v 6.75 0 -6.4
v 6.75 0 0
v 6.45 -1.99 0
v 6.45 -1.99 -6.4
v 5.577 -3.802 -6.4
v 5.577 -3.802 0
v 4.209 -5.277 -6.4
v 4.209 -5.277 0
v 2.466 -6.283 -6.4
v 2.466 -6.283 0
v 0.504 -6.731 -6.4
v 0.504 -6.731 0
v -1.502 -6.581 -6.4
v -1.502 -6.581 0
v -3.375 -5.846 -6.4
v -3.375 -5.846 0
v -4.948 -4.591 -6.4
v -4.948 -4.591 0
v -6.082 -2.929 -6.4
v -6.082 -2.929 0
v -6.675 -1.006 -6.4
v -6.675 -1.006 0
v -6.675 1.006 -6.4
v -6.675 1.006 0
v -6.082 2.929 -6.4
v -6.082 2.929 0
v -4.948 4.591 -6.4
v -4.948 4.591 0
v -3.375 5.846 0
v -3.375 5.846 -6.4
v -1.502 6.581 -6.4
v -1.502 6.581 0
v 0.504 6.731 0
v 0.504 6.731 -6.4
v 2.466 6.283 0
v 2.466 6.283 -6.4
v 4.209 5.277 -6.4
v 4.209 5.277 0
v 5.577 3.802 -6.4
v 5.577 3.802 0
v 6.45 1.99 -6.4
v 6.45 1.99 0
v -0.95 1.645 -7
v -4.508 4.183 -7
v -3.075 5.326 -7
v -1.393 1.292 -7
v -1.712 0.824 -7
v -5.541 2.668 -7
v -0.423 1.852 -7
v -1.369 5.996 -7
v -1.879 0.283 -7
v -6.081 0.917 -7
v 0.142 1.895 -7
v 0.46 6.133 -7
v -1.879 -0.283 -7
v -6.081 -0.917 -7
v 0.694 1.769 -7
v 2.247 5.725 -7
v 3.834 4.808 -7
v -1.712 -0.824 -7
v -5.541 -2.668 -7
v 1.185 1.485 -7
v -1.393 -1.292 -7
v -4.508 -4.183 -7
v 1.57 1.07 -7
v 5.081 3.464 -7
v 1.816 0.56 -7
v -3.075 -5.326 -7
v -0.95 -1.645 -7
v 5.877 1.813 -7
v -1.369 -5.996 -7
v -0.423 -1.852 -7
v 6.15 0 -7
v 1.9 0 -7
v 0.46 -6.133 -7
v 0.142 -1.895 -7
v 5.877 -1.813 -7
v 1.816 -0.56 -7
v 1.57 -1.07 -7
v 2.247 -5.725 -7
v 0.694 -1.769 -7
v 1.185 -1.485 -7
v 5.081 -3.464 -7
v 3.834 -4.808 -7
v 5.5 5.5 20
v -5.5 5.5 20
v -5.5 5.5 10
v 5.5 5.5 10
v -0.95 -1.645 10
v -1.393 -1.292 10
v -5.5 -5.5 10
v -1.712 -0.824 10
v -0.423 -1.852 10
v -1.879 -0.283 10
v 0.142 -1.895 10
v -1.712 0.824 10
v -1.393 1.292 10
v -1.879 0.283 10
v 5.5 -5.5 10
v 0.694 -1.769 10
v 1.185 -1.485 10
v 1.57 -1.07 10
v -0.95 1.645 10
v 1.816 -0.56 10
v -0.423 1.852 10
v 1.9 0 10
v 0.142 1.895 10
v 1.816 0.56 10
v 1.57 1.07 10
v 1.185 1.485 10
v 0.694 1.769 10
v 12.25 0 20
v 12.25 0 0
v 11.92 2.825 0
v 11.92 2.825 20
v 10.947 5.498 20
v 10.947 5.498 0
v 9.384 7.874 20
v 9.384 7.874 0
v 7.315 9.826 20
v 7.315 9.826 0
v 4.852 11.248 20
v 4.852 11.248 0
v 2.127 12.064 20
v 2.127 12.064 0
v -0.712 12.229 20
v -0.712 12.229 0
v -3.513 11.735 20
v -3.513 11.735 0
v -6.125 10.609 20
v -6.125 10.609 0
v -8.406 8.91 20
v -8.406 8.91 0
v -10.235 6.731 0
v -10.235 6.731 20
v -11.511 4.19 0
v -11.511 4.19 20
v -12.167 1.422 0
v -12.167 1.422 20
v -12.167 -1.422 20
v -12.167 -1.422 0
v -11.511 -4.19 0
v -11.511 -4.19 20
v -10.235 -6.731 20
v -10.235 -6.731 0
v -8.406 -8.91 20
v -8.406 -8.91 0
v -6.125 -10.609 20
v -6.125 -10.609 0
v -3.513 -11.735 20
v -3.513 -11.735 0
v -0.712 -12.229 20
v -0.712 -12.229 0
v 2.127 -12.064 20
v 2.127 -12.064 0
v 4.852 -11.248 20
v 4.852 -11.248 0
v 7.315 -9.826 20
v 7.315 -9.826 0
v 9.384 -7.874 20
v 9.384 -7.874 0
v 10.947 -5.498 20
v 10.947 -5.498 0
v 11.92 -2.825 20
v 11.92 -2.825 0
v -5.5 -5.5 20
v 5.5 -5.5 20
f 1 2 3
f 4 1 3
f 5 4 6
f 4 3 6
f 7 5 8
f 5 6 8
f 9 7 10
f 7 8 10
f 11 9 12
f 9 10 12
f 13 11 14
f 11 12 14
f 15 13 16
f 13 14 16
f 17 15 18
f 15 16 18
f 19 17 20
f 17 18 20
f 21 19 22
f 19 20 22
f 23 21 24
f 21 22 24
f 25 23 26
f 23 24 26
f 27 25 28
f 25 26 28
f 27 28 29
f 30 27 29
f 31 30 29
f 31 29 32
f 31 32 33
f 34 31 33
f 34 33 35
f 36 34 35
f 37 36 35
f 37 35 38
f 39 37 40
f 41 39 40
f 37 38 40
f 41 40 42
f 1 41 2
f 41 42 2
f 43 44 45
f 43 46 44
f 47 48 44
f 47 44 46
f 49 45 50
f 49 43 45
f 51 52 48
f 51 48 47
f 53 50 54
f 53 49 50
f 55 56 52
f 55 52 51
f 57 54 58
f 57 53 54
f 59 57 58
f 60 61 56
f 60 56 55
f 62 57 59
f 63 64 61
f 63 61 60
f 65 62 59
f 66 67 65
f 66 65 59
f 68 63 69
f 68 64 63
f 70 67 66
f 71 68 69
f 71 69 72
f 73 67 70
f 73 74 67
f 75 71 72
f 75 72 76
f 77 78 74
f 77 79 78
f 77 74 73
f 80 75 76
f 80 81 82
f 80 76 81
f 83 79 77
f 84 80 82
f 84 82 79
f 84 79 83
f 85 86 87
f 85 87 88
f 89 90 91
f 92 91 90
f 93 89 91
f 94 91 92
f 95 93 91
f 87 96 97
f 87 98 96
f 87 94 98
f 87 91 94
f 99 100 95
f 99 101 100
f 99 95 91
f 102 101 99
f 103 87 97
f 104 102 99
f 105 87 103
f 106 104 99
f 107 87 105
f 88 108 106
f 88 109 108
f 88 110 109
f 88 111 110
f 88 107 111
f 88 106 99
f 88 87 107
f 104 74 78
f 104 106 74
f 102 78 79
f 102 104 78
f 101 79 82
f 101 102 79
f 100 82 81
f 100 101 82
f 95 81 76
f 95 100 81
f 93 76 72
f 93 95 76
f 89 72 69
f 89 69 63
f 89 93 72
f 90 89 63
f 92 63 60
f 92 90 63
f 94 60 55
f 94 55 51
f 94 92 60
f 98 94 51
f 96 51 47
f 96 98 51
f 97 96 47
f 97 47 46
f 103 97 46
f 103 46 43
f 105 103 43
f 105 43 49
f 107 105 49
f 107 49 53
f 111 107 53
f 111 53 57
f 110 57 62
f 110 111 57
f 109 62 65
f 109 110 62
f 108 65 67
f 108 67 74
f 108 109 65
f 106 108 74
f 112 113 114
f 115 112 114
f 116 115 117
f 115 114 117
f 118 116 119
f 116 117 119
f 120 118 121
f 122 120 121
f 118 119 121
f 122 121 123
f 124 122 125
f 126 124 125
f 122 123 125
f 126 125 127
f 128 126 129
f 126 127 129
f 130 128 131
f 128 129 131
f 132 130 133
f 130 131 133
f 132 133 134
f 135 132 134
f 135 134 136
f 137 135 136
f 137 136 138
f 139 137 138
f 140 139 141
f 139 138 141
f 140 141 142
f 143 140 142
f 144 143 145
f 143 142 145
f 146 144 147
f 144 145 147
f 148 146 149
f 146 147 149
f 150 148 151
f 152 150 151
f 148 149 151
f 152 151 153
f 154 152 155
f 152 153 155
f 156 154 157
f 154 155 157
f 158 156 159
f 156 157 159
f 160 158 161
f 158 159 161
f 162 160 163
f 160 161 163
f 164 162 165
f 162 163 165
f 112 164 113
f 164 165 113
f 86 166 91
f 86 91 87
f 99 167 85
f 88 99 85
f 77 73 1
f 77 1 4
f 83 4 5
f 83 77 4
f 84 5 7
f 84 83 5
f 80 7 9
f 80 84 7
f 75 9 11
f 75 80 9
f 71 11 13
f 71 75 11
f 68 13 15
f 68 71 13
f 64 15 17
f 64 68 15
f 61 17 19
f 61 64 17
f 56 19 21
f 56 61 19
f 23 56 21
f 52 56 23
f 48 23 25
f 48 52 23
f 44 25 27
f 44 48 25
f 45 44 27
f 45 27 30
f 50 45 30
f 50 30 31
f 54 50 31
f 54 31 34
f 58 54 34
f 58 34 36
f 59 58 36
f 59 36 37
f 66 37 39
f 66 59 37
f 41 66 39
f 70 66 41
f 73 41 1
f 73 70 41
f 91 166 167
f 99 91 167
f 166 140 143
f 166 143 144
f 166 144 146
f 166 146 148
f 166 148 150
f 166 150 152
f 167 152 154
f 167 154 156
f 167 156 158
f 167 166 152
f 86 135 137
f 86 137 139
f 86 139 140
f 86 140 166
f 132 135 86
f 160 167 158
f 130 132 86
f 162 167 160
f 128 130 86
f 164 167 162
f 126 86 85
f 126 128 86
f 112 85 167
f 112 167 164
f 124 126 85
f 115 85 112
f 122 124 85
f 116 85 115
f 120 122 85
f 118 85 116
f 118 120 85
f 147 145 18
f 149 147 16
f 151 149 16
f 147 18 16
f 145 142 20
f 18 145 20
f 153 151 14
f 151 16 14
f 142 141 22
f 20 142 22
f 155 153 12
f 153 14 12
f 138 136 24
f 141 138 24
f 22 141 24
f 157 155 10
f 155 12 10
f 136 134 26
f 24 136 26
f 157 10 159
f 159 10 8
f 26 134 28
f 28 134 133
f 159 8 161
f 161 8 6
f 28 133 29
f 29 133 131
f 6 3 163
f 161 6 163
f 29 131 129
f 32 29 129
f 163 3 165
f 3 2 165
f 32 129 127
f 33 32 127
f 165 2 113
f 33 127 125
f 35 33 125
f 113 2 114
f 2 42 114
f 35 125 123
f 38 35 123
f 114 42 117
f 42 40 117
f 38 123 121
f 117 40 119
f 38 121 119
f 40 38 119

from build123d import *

# Parameters (mm, degrees)
F0_R     = 12.25
F1_DEPTH = 20
F2_W     = 11
F2_H     = 11
F3_DEPTH = 10
F4_R     = 1.9
F5_DEPTH = 40
F6_R     = 6.75
F6_R_2   = 1.9
F7_DEPTH = 7
F8_SIZE  = 0.6


with BuildPart() as f1:
    # F0 (on Top) → F1 (new body)
    with BuildSketch(Plane.XY):
        Circle(F0_R)
    extrude(amount=F1_DEPTH)

    # F2 (on face) → F3 (cut)
    with BuildSketch(Plane.XY.offset(20)):
        Rectangle(F2_W, F2_H)
    extrude(amount=-F3_DEPTH, mode=Mode.SUBTRACT)

    # F4 (on face) → F5 (cut)
    with BuildSketch(Plane.XY.offset(10)):
        Circle(F4_R)
    extrude(amount=-F5_DEPTH, mode=Mode.SUBTRACT)

    # F6 (on face) → F7 (join)
    with BuildSketch(Plane(origin=(0, 0, 0), x_dir=(1, 0, 0), z_dir=(0, 0, -1))):
        Circle(F6_R)
        Circle(F6_R_2, mode=Mode.SUBTRACT)
    extrude(amount=F7_DEPTH)

    # F8
    f8_edges = [f1.edges().sort_by_distance(p)[0] for p in [
        (-6.75, 0, -7),
    ]]
    chamfer(f8_edges, length=F8_SIZE)


solid = f1.part
